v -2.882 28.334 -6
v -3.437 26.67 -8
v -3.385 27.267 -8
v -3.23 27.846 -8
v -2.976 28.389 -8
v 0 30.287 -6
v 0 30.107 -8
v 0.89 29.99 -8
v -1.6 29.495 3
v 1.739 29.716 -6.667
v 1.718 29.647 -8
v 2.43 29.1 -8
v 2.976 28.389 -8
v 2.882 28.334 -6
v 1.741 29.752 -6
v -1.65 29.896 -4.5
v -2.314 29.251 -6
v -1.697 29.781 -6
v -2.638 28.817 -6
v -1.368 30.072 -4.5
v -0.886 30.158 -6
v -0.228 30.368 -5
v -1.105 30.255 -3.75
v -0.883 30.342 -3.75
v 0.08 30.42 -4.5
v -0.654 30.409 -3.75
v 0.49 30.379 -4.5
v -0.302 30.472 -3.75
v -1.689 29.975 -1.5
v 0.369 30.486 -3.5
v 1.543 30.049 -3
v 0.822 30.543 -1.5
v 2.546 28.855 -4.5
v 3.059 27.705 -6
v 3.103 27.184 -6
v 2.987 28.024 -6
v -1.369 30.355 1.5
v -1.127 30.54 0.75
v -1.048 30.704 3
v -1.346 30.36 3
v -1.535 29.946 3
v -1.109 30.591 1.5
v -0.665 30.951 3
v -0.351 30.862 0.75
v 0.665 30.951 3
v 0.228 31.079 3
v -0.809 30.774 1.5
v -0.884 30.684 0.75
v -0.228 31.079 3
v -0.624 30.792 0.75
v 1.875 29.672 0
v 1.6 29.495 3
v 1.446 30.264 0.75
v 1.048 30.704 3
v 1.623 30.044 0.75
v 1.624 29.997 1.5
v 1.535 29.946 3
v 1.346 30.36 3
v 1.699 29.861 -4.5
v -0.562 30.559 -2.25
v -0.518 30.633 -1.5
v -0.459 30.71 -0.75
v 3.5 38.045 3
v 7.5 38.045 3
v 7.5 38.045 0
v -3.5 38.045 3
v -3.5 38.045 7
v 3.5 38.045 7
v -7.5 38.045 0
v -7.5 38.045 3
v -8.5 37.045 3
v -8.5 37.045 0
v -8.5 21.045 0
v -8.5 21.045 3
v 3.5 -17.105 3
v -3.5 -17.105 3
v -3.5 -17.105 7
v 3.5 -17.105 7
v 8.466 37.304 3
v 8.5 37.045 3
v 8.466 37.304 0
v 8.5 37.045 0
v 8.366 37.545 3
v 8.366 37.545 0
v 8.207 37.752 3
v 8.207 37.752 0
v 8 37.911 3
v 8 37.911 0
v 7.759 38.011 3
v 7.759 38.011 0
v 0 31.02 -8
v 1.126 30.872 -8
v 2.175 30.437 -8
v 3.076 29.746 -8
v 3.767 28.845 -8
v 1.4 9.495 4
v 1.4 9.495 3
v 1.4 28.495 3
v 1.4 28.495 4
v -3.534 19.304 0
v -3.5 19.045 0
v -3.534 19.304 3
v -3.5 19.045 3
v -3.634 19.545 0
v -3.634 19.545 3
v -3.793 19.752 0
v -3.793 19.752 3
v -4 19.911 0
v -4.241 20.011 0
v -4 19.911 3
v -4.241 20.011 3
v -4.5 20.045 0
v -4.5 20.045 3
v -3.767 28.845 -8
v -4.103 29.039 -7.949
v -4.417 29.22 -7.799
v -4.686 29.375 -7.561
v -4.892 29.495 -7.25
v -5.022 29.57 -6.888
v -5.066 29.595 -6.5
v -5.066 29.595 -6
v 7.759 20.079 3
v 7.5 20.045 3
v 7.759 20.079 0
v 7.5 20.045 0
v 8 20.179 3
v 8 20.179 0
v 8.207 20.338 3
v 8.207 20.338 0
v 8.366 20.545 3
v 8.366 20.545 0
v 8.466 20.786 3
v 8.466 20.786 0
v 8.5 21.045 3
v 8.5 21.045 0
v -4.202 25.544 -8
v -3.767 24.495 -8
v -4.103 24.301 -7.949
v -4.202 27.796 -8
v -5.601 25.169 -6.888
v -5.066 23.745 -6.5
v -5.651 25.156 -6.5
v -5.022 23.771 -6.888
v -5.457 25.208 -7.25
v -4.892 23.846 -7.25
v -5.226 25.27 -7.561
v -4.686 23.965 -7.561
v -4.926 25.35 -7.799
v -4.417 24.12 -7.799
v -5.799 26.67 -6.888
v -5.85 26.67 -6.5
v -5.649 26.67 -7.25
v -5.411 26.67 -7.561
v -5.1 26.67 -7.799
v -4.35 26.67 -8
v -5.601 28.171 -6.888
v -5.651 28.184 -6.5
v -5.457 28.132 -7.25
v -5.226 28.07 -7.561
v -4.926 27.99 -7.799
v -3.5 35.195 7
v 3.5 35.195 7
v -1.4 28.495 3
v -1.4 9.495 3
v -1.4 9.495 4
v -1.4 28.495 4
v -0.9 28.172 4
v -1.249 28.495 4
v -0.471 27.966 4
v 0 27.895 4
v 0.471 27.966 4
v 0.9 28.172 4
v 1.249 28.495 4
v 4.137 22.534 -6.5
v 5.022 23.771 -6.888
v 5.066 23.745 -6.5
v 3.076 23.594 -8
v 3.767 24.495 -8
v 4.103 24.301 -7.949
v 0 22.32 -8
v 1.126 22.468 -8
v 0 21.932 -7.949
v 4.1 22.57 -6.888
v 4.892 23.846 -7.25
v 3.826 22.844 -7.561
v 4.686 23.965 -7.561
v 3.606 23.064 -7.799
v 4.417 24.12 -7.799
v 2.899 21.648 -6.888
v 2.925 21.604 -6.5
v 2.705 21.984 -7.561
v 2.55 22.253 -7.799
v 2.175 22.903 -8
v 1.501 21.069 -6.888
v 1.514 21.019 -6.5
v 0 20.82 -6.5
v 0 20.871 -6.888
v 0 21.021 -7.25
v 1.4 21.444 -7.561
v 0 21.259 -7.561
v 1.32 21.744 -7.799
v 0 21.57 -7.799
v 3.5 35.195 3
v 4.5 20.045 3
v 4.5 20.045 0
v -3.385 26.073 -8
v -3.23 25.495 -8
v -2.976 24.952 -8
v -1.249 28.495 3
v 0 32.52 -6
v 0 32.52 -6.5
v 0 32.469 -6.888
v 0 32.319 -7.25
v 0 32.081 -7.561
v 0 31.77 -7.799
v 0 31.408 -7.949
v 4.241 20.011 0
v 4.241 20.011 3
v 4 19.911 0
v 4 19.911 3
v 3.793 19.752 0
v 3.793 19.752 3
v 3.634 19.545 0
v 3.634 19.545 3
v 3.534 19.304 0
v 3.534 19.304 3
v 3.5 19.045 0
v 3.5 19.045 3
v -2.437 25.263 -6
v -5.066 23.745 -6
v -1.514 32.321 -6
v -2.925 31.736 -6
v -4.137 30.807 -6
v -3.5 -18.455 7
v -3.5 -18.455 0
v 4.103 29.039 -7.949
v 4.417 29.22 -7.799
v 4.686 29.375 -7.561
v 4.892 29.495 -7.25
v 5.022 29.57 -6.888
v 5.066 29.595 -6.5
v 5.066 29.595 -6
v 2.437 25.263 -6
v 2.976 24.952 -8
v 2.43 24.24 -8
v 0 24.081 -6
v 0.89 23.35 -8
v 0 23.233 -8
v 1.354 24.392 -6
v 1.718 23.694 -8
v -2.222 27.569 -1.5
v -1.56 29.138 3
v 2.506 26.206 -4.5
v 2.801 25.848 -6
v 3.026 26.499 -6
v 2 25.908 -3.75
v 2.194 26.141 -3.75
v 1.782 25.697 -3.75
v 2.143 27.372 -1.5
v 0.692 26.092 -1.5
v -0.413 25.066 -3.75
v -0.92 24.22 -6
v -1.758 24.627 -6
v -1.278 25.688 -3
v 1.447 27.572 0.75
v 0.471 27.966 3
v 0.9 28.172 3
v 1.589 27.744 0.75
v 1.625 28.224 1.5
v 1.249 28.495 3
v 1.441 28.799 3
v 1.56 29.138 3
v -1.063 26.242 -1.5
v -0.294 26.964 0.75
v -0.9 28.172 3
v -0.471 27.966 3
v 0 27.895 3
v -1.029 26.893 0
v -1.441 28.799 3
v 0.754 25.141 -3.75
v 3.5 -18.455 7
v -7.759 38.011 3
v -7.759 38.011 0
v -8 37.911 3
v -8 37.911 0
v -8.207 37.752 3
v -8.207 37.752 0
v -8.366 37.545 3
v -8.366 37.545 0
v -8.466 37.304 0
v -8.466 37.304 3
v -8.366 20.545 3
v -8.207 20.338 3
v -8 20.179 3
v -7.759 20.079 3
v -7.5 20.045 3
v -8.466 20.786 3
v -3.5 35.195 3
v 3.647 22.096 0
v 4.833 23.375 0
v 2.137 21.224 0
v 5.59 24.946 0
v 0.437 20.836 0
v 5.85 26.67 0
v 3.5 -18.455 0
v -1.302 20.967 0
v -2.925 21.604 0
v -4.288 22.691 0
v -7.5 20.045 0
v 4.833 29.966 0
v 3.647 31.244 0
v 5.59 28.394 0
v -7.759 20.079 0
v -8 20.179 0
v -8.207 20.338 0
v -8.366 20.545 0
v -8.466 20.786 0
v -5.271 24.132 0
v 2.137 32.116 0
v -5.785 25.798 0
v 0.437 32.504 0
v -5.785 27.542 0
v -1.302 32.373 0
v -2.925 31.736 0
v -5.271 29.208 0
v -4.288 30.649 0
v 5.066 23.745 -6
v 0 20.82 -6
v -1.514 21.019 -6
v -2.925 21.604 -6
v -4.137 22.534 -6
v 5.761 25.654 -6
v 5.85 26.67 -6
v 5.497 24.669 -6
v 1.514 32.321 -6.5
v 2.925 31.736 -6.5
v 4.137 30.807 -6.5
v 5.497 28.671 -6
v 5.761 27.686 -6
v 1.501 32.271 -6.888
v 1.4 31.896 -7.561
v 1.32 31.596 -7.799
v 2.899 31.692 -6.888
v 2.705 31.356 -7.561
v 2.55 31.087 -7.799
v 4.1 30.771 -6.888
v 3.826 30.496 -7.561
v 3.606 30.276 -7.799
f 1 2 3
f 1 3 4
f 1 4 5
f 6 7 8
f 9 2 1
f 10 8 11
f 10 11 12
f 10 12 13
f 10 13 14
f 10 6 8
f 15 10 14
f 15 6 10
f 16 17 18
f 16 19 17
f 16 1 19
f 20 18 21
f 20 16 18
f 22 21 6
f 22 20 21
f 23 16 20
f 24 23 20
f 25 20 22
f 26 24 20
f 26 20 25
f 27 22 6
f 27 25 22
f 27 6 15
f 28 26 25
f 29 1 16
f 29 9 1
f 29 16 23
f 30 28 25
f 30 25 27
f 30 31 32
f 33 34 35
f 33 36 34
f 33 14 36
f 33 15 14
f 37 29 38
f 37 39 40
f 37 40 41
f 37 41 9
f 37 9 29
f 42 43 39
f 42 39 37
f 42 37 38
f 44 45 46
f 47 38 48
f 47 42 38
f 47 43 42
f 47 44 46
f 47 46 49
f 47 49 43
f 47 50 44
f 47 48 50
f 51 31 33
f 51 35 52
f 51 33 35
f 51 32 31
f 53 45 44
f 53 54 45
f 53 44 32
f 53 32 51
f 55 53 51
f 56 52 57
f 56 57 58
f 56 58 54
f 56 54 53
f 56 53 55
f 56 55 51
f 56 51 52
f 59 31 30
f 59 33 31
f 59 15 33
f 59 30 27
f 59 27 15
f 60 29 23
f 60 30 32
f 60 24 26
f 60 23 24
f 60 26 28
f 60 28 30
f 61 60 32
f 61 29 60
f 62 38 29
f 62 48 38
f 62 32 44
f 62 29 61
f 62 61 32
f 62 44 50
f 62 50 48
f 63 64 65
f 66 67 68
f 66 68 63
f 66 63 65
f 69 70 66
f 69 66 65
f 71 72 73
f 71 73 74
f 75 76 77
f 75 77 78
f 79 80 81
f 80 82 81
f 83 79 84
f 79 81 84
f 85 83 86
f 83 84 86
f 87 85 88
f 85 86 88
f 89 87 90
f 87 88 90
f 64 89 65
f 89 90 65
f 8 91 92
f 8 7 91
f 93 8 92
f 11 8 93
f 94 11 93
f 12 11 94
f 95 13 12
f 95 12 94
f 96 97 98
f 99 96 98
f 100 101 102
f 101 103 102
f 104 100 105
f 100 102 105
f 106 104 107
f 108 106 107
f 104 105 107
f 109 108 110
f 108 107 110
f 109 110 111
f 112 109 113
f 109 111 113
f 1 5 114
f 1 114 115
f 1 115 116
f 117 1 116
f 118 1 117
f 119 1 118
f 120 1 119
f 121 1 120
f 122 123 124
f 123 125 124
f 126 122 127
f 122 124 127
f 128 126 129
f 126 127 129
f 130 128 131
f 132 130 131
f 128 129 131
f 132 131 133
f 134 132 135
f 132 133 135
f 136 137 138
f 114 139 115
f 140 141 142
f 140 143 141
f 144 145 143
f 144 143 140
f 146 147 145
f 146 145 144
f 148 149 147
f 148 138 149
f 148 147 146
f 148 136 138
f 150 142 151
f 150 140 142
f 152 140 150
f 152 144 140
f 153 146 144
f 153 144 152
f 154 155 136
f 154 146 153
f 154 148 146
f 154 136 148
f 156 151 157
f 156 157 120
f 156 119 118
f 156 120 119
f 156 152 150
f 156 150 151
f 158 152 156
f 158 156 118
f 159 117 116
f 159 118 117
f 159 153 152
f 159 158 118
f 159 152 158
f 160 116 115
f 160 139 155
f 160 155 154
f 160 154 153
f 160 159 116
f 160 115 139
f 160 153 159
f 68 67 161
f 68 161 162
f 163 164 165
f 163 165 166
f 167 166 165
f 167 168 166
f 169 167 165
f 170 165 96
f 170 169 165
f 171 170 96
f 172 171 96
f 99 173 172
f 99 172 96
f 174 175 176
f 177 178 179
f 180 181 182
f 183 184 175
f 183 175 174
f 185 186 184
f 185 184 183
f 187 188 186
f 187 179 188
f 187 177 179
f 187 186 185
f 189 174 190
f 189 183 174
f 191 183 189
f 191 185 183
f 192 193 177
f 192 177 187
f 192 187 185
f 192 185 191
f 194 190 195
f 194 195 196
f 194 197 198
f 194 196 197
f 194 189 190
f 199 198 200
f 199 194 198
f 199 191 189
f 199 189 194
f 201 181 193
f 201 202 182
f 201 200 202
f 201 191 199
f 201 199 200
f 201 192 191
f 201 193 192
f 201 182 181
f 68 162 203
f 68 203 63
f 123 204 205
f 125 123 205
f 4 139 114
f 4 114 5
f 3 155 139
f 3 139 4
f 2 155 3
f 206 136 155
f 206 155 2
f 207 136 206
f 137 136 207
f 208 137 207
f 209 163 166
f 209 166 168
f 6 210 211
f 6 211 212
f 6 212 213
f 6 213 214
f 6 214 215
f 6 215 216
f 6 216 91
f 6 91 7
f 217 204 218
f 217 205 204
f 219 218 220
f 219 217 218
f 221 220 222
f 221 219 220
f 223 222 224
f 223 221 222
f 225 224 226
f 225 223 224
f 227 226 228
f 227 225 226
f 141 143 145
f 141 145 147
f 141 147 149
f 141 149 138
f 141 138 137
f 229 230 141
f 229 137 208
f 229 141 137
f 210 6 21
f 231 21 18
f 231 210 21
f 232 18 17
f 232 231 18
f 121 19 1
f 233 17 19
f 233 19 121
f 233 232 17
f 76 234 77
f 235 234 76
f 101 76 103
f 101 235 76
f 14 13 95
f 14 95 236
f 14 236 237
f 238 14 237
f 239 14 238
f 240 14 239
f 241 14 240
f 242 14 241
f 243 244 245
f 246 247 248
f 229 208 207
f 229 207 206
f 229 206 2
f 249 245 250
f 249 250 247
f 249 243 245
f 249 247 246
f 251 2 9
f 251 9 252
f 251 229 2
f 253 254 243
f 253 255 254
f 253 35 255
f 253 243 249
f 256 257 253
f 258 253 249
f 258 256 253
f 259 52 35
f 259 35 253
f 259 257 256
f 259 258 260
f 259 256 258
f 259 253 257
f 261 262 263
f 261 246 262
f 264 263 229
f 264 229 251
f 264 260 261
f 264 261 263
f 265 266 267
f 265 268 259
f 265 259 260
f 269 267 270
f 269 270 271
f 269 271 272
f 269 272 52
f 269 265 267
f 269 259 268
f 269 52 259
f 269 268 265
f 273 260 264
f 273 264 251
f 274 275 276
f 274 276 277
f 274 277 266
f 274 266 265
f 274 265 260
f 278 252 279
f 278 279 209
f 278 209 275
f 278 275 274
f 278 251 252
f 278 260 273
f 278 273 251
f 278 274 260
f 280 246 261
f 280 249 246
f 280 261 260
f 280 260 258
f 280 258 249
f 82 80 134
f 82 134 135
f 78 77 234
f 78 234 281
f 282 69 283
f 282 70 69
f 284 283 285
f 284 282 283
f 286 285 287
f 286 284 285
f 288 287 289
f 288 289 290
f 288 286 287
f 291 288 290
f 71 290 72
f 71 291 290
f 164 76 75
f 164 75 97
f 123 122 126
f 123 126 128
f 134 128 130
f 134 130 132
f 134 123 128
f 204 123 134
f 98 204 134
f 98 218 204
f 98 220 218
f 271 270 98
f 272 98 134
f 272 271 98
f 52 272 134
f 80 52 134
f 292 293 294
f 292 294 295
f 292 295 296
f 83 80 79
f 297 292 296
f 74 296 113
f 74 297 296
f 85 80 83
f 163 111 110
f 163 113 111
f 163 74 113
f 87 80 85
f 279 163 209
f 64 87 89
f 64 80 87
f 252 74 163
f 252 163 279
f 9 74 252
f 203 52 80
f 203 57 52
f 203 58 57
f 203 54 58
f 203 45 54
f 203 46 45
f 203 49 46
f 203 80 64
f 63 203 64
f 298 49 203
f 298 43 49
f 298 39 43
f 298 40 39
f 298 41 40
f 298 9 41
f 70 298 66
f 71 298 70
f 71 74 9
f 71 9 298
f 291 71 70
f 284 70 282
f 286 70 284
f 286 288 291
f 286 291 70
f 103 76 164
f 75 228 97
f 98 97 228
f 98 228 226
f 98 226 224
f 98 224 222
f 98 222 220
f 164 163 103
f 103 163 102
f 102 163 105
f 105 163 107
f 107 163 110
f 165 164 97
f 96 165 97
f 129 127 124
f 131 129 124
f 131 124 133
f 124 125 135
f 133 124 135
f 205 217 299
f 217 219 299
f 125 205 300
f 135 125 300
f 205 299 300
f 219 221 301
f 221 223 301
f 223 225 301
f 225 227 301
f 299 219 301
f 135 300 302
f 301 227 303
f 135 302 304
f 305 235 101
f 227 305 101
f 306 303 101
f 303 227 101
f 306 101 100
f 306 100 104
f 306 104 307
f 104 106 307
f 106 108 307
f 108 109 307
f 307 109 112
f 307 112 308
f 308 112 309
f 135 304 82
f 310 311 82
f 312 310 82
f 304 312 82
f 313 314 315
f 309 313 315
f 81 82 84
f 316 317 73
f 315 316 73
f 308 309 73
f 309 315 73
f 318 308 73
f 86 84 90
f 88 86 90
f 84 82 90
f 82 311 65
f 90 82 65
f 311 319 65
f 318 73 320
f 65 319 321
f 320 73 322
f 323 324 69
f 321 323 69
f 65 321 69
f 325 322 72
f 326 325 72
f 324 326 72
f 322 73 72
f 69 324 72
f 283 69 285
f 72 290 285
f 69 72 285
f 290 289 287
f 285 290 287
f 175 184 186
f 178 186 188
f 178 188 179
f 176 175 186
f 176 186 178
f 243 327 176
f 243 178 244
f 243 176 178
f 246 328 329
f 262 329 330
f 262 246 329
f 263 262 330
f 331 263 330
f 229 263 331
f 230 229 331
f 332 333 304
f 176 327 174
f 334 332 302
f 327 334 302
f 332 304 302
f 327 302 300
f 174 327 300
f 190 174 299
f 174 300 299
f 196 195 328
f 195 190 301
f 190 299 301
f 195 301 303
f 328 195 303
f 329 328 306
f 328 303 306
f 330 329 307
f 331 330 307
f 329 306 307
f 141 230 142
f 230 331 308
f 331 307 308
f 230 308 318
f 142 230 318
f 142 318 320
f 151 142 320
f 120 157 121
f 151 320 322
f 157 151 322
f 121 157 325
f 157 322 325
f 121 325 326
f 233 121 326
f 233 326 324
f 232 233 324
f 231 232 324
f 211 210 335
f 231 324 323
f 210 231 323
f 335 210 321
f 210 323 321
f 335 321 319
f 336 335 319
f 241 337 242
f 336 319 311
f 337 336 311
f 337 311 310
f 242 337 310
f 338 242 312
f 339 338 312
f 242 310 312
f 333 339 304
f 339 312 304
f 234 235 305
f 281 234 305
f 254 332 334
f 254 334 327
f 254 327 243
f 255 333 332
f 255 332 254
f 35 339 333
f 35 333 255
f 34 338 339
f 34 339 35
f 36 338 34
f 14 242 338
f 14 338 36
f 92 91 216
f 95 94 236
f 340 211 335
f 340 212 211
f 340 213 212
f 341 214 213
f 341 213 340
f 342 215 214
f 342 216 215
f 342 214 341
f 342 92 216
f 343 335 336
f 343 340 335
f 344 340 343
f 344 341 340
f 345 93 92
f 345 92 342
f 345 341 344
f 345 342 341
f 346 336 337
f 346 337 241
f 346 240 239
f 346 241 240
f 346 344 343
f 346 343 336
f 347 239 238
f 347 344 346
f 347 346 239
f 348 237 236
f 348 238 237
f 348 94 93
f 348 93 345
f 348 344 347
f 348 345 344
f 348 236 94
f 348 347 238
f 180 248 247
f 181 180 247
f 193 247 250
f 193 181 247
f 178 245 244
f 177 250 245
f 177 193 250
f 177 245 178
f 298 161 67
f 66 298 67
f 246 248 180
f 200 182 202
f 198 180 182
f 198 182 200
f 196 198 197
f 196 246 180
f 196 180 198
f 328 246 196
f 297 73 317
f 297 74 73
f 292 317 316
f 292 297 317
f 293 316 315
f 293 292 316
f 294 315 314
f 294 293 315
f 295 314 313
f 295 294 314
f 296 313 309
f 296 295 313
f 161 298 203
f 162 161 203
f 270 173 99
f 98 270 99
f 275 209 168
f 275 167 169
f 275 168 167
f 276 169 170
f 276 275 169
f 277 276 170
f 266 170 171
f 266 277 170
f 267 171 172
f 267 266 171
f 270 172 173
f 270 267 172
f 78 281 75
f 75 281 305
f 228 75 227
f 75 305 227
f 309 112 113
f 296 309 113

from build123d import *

# Parameters (mm, degrees)
SKETCH1_W           = 7
SKETCH1_H           = 56.5
BOSS_EXTRUDE1_DEPTH = 3
SKETCH2_W           = 2.8
SKETCH2_H           = 19
BOSS_EXTRUDE2_DEPTH = 1
SKETCH3_W           = 7
SKETCH3_H           = 2.85
SKETCH3_H_2         = 1.35
BOSS_EXTRUDE3_DEPTH = 4
SKETCH4_W           = 3
SKETCH4_H           = 18
BOSS_EXTRUDE4_DEPTH = 5
SKETCH5_W           = 3
SKETCH5_H           = 18
BOSS_EXTRUDE5_DEPTH = 5
SKETCH9_R           = 5.85
BOSS_EXTRUDE7_DEPTH = 8
FILLET1_R           = 1.5
FILLET2_R           = 1
SKETCH11_R          = 3.436863838
SKETCH7_R           = 1.6
CUT_EXTRUDE5_START  = -2
CUT_EXTRUDE5_DEPTH  = 2
SKETCH14_R          = 1.6
CUT_EXTRUDE6_DEPTH  = 3


with BuildPart() as part:
    # Sketch1 → Boss-Extrude1 (new body)
    with BuildSketch(Plane.XY):
        with Locations((0, 9.795104227)):
            Rectangle(SKETCH1_W, SKETCH1_H)
    extrude(amount=BOSS_EXTRUDE1_DEPTH)

    # Sketch2 → Boss-Extrude2 (add)
    with BuildSketch(Plane.XY.offset(3)):
        with Locations((0, 18.995104227)):
            Rectangle(SKETCH2_W, SKETCH2_H)
    extrude(amount=BOSS_EXTRUDE2_DEPTH)

    # Sketch3 → Boss-Extrude3 (add)
    with BuildSketch(Plane.XY.offset(3)):
        with Locations((0, 36.620104227)):
            Rectangle(SKETCH3_W, SKETCH3_H)
        with Locations((0, -17.779895773)):
            Rectangle(SKETCH3_W, SKETCH3_H_2)
    extrude(amount=BOSS_EXTRUDE3_DEPTH)

    # Sketch4 → Boss-Extrude4 (add)
    with BuildSketch(Plane.ZY.offset(3.5)):
        with Locations((1.5, 29.045104227)):
            Rectangle(SKETCH4_W, SKETCH4_H)
    extrude(amount=BOSS_EXTRUDE4_DEPTH)

    # Sketch5 → Boss-Extrude5 (add)
    with BuildSketch(Plane(origin=(3.5, 0, 0), x_dir=(0, 0, -1), z_dir=(1, 0, 0))):
        with Locations((-1.5, 29.045104227)):
            Rectangle(SKETCH5_W, SKETCH5_H)
    extrude(amount=BOSS_EXTRUDE5_DEPTH)

    # Sketch9 → Boss-Extrude7 (add)
    with BuildSketch(Plane(origin=(0, 0, 0), x_dir=(-1, 0, 0), z_dir=(0, 0, -1))):
        with Locations(Location((0, 26.670104227, 0), (0, 0, 180))):
            Circle(SKETCH9_R)
    extrude(amount=BOSS_EXTRUDE7_DEPTH)

    # Fillet1
    fillet1_edges = [part.edges().sort_by_distance(p)[0] for p in [
        (-5.85, 26.670104227, -8),
    ]]
    fillet(fillet1_edges, radius=FILLET1_R)

    # Fillet2
    fillet2_edges = [part.edges().sort_by_distance(p)[0] for p in [
        (-3.5, 20.045104227, 1.5),
        (-8.5, 20.045104227, 1.5),
        (-8.5, 38.045104227, 1.5),
        (3.5, 20.045104227, 1.5),
        (8.5, 38.045104227, 1.5),
        (8.5, 20.045104227, 1.5),
    ]]
    fillet(fillet2_edges, radius=FILLET2_R)

    # Sketch11 → Cut-Loft6 section 0
    with BuildSketch(Plane(origin=(0, 0, -8), x_dir=(-1, 0, 0), z_dir=(0, 0, -1))):
        with Locations((0, 26.670104227)):
            Circle(SKETCH11_R)
    # Sketch7 → Cut-Loft6 section 1
    with BuildSketch(Plane.XY.offset(3)):
        with Locations((0, 29.495104227)):
            Circle(SKETCH7_R)
    loft(mode=Mode.SUBTRACT)

    # Cut-Extrude5: read off the stored shape, not the designer's step
    # Cut-Extrude5 outline → Cut-Extrude5 (cut)
    with BuildSketch(Plane(origin=(0, 0, -8), x_dir=(-1, 0, 0), z_dir=(0, 0, -1)).offset(CUT_EXTRUDE5_START)):
        with BuildLine():
            ThreePointArc((5.066248612, 29.595104227), (2.925, 31.736352839), (0, 32.520104227))
            Line((0, 32.520104227), (0, 26.670104227))
            Line((0, 26.670104227), (5.066248612, 29.595104227))
        make_face()
        with BuildLine():
            Line((0, 26.670104227), (-5.066248612, 29.595104227))
            ThreePointArc((-5.066248612, 29.595104227), (-5.85, 26.670104227), (-5.066248612, 23.745104227))
            Line((-5.066248612, 23.745104227), (0, 26.670104227))
        make_face()
        with BuildLine():
            Line((5.066248612, 23.745104227), (0, 26.670104227))
            Line((0, 26.670104227), (0, 20.820104227))
            ThreePointArc((0, 20.820104227), (2.925, 21.603855615), (5.066248612, 23.745104227))
        make_face()
    extrude(amount=CUT_EXTRUDE5_DEPTH, mode=Mode.SUBTRACT)

    # Sketch14 → Cut-Extrude6 (cut)
    with BuildSketch(Plane.XY.offset(3)):
        with Locations((0, 29.495104227)):
            Circle(SKETCH14_R)
    extrude(amount=CUT_EXTRUDE6_DEPTH, mode=Mode.SUBTRACT)


solid = part.part
